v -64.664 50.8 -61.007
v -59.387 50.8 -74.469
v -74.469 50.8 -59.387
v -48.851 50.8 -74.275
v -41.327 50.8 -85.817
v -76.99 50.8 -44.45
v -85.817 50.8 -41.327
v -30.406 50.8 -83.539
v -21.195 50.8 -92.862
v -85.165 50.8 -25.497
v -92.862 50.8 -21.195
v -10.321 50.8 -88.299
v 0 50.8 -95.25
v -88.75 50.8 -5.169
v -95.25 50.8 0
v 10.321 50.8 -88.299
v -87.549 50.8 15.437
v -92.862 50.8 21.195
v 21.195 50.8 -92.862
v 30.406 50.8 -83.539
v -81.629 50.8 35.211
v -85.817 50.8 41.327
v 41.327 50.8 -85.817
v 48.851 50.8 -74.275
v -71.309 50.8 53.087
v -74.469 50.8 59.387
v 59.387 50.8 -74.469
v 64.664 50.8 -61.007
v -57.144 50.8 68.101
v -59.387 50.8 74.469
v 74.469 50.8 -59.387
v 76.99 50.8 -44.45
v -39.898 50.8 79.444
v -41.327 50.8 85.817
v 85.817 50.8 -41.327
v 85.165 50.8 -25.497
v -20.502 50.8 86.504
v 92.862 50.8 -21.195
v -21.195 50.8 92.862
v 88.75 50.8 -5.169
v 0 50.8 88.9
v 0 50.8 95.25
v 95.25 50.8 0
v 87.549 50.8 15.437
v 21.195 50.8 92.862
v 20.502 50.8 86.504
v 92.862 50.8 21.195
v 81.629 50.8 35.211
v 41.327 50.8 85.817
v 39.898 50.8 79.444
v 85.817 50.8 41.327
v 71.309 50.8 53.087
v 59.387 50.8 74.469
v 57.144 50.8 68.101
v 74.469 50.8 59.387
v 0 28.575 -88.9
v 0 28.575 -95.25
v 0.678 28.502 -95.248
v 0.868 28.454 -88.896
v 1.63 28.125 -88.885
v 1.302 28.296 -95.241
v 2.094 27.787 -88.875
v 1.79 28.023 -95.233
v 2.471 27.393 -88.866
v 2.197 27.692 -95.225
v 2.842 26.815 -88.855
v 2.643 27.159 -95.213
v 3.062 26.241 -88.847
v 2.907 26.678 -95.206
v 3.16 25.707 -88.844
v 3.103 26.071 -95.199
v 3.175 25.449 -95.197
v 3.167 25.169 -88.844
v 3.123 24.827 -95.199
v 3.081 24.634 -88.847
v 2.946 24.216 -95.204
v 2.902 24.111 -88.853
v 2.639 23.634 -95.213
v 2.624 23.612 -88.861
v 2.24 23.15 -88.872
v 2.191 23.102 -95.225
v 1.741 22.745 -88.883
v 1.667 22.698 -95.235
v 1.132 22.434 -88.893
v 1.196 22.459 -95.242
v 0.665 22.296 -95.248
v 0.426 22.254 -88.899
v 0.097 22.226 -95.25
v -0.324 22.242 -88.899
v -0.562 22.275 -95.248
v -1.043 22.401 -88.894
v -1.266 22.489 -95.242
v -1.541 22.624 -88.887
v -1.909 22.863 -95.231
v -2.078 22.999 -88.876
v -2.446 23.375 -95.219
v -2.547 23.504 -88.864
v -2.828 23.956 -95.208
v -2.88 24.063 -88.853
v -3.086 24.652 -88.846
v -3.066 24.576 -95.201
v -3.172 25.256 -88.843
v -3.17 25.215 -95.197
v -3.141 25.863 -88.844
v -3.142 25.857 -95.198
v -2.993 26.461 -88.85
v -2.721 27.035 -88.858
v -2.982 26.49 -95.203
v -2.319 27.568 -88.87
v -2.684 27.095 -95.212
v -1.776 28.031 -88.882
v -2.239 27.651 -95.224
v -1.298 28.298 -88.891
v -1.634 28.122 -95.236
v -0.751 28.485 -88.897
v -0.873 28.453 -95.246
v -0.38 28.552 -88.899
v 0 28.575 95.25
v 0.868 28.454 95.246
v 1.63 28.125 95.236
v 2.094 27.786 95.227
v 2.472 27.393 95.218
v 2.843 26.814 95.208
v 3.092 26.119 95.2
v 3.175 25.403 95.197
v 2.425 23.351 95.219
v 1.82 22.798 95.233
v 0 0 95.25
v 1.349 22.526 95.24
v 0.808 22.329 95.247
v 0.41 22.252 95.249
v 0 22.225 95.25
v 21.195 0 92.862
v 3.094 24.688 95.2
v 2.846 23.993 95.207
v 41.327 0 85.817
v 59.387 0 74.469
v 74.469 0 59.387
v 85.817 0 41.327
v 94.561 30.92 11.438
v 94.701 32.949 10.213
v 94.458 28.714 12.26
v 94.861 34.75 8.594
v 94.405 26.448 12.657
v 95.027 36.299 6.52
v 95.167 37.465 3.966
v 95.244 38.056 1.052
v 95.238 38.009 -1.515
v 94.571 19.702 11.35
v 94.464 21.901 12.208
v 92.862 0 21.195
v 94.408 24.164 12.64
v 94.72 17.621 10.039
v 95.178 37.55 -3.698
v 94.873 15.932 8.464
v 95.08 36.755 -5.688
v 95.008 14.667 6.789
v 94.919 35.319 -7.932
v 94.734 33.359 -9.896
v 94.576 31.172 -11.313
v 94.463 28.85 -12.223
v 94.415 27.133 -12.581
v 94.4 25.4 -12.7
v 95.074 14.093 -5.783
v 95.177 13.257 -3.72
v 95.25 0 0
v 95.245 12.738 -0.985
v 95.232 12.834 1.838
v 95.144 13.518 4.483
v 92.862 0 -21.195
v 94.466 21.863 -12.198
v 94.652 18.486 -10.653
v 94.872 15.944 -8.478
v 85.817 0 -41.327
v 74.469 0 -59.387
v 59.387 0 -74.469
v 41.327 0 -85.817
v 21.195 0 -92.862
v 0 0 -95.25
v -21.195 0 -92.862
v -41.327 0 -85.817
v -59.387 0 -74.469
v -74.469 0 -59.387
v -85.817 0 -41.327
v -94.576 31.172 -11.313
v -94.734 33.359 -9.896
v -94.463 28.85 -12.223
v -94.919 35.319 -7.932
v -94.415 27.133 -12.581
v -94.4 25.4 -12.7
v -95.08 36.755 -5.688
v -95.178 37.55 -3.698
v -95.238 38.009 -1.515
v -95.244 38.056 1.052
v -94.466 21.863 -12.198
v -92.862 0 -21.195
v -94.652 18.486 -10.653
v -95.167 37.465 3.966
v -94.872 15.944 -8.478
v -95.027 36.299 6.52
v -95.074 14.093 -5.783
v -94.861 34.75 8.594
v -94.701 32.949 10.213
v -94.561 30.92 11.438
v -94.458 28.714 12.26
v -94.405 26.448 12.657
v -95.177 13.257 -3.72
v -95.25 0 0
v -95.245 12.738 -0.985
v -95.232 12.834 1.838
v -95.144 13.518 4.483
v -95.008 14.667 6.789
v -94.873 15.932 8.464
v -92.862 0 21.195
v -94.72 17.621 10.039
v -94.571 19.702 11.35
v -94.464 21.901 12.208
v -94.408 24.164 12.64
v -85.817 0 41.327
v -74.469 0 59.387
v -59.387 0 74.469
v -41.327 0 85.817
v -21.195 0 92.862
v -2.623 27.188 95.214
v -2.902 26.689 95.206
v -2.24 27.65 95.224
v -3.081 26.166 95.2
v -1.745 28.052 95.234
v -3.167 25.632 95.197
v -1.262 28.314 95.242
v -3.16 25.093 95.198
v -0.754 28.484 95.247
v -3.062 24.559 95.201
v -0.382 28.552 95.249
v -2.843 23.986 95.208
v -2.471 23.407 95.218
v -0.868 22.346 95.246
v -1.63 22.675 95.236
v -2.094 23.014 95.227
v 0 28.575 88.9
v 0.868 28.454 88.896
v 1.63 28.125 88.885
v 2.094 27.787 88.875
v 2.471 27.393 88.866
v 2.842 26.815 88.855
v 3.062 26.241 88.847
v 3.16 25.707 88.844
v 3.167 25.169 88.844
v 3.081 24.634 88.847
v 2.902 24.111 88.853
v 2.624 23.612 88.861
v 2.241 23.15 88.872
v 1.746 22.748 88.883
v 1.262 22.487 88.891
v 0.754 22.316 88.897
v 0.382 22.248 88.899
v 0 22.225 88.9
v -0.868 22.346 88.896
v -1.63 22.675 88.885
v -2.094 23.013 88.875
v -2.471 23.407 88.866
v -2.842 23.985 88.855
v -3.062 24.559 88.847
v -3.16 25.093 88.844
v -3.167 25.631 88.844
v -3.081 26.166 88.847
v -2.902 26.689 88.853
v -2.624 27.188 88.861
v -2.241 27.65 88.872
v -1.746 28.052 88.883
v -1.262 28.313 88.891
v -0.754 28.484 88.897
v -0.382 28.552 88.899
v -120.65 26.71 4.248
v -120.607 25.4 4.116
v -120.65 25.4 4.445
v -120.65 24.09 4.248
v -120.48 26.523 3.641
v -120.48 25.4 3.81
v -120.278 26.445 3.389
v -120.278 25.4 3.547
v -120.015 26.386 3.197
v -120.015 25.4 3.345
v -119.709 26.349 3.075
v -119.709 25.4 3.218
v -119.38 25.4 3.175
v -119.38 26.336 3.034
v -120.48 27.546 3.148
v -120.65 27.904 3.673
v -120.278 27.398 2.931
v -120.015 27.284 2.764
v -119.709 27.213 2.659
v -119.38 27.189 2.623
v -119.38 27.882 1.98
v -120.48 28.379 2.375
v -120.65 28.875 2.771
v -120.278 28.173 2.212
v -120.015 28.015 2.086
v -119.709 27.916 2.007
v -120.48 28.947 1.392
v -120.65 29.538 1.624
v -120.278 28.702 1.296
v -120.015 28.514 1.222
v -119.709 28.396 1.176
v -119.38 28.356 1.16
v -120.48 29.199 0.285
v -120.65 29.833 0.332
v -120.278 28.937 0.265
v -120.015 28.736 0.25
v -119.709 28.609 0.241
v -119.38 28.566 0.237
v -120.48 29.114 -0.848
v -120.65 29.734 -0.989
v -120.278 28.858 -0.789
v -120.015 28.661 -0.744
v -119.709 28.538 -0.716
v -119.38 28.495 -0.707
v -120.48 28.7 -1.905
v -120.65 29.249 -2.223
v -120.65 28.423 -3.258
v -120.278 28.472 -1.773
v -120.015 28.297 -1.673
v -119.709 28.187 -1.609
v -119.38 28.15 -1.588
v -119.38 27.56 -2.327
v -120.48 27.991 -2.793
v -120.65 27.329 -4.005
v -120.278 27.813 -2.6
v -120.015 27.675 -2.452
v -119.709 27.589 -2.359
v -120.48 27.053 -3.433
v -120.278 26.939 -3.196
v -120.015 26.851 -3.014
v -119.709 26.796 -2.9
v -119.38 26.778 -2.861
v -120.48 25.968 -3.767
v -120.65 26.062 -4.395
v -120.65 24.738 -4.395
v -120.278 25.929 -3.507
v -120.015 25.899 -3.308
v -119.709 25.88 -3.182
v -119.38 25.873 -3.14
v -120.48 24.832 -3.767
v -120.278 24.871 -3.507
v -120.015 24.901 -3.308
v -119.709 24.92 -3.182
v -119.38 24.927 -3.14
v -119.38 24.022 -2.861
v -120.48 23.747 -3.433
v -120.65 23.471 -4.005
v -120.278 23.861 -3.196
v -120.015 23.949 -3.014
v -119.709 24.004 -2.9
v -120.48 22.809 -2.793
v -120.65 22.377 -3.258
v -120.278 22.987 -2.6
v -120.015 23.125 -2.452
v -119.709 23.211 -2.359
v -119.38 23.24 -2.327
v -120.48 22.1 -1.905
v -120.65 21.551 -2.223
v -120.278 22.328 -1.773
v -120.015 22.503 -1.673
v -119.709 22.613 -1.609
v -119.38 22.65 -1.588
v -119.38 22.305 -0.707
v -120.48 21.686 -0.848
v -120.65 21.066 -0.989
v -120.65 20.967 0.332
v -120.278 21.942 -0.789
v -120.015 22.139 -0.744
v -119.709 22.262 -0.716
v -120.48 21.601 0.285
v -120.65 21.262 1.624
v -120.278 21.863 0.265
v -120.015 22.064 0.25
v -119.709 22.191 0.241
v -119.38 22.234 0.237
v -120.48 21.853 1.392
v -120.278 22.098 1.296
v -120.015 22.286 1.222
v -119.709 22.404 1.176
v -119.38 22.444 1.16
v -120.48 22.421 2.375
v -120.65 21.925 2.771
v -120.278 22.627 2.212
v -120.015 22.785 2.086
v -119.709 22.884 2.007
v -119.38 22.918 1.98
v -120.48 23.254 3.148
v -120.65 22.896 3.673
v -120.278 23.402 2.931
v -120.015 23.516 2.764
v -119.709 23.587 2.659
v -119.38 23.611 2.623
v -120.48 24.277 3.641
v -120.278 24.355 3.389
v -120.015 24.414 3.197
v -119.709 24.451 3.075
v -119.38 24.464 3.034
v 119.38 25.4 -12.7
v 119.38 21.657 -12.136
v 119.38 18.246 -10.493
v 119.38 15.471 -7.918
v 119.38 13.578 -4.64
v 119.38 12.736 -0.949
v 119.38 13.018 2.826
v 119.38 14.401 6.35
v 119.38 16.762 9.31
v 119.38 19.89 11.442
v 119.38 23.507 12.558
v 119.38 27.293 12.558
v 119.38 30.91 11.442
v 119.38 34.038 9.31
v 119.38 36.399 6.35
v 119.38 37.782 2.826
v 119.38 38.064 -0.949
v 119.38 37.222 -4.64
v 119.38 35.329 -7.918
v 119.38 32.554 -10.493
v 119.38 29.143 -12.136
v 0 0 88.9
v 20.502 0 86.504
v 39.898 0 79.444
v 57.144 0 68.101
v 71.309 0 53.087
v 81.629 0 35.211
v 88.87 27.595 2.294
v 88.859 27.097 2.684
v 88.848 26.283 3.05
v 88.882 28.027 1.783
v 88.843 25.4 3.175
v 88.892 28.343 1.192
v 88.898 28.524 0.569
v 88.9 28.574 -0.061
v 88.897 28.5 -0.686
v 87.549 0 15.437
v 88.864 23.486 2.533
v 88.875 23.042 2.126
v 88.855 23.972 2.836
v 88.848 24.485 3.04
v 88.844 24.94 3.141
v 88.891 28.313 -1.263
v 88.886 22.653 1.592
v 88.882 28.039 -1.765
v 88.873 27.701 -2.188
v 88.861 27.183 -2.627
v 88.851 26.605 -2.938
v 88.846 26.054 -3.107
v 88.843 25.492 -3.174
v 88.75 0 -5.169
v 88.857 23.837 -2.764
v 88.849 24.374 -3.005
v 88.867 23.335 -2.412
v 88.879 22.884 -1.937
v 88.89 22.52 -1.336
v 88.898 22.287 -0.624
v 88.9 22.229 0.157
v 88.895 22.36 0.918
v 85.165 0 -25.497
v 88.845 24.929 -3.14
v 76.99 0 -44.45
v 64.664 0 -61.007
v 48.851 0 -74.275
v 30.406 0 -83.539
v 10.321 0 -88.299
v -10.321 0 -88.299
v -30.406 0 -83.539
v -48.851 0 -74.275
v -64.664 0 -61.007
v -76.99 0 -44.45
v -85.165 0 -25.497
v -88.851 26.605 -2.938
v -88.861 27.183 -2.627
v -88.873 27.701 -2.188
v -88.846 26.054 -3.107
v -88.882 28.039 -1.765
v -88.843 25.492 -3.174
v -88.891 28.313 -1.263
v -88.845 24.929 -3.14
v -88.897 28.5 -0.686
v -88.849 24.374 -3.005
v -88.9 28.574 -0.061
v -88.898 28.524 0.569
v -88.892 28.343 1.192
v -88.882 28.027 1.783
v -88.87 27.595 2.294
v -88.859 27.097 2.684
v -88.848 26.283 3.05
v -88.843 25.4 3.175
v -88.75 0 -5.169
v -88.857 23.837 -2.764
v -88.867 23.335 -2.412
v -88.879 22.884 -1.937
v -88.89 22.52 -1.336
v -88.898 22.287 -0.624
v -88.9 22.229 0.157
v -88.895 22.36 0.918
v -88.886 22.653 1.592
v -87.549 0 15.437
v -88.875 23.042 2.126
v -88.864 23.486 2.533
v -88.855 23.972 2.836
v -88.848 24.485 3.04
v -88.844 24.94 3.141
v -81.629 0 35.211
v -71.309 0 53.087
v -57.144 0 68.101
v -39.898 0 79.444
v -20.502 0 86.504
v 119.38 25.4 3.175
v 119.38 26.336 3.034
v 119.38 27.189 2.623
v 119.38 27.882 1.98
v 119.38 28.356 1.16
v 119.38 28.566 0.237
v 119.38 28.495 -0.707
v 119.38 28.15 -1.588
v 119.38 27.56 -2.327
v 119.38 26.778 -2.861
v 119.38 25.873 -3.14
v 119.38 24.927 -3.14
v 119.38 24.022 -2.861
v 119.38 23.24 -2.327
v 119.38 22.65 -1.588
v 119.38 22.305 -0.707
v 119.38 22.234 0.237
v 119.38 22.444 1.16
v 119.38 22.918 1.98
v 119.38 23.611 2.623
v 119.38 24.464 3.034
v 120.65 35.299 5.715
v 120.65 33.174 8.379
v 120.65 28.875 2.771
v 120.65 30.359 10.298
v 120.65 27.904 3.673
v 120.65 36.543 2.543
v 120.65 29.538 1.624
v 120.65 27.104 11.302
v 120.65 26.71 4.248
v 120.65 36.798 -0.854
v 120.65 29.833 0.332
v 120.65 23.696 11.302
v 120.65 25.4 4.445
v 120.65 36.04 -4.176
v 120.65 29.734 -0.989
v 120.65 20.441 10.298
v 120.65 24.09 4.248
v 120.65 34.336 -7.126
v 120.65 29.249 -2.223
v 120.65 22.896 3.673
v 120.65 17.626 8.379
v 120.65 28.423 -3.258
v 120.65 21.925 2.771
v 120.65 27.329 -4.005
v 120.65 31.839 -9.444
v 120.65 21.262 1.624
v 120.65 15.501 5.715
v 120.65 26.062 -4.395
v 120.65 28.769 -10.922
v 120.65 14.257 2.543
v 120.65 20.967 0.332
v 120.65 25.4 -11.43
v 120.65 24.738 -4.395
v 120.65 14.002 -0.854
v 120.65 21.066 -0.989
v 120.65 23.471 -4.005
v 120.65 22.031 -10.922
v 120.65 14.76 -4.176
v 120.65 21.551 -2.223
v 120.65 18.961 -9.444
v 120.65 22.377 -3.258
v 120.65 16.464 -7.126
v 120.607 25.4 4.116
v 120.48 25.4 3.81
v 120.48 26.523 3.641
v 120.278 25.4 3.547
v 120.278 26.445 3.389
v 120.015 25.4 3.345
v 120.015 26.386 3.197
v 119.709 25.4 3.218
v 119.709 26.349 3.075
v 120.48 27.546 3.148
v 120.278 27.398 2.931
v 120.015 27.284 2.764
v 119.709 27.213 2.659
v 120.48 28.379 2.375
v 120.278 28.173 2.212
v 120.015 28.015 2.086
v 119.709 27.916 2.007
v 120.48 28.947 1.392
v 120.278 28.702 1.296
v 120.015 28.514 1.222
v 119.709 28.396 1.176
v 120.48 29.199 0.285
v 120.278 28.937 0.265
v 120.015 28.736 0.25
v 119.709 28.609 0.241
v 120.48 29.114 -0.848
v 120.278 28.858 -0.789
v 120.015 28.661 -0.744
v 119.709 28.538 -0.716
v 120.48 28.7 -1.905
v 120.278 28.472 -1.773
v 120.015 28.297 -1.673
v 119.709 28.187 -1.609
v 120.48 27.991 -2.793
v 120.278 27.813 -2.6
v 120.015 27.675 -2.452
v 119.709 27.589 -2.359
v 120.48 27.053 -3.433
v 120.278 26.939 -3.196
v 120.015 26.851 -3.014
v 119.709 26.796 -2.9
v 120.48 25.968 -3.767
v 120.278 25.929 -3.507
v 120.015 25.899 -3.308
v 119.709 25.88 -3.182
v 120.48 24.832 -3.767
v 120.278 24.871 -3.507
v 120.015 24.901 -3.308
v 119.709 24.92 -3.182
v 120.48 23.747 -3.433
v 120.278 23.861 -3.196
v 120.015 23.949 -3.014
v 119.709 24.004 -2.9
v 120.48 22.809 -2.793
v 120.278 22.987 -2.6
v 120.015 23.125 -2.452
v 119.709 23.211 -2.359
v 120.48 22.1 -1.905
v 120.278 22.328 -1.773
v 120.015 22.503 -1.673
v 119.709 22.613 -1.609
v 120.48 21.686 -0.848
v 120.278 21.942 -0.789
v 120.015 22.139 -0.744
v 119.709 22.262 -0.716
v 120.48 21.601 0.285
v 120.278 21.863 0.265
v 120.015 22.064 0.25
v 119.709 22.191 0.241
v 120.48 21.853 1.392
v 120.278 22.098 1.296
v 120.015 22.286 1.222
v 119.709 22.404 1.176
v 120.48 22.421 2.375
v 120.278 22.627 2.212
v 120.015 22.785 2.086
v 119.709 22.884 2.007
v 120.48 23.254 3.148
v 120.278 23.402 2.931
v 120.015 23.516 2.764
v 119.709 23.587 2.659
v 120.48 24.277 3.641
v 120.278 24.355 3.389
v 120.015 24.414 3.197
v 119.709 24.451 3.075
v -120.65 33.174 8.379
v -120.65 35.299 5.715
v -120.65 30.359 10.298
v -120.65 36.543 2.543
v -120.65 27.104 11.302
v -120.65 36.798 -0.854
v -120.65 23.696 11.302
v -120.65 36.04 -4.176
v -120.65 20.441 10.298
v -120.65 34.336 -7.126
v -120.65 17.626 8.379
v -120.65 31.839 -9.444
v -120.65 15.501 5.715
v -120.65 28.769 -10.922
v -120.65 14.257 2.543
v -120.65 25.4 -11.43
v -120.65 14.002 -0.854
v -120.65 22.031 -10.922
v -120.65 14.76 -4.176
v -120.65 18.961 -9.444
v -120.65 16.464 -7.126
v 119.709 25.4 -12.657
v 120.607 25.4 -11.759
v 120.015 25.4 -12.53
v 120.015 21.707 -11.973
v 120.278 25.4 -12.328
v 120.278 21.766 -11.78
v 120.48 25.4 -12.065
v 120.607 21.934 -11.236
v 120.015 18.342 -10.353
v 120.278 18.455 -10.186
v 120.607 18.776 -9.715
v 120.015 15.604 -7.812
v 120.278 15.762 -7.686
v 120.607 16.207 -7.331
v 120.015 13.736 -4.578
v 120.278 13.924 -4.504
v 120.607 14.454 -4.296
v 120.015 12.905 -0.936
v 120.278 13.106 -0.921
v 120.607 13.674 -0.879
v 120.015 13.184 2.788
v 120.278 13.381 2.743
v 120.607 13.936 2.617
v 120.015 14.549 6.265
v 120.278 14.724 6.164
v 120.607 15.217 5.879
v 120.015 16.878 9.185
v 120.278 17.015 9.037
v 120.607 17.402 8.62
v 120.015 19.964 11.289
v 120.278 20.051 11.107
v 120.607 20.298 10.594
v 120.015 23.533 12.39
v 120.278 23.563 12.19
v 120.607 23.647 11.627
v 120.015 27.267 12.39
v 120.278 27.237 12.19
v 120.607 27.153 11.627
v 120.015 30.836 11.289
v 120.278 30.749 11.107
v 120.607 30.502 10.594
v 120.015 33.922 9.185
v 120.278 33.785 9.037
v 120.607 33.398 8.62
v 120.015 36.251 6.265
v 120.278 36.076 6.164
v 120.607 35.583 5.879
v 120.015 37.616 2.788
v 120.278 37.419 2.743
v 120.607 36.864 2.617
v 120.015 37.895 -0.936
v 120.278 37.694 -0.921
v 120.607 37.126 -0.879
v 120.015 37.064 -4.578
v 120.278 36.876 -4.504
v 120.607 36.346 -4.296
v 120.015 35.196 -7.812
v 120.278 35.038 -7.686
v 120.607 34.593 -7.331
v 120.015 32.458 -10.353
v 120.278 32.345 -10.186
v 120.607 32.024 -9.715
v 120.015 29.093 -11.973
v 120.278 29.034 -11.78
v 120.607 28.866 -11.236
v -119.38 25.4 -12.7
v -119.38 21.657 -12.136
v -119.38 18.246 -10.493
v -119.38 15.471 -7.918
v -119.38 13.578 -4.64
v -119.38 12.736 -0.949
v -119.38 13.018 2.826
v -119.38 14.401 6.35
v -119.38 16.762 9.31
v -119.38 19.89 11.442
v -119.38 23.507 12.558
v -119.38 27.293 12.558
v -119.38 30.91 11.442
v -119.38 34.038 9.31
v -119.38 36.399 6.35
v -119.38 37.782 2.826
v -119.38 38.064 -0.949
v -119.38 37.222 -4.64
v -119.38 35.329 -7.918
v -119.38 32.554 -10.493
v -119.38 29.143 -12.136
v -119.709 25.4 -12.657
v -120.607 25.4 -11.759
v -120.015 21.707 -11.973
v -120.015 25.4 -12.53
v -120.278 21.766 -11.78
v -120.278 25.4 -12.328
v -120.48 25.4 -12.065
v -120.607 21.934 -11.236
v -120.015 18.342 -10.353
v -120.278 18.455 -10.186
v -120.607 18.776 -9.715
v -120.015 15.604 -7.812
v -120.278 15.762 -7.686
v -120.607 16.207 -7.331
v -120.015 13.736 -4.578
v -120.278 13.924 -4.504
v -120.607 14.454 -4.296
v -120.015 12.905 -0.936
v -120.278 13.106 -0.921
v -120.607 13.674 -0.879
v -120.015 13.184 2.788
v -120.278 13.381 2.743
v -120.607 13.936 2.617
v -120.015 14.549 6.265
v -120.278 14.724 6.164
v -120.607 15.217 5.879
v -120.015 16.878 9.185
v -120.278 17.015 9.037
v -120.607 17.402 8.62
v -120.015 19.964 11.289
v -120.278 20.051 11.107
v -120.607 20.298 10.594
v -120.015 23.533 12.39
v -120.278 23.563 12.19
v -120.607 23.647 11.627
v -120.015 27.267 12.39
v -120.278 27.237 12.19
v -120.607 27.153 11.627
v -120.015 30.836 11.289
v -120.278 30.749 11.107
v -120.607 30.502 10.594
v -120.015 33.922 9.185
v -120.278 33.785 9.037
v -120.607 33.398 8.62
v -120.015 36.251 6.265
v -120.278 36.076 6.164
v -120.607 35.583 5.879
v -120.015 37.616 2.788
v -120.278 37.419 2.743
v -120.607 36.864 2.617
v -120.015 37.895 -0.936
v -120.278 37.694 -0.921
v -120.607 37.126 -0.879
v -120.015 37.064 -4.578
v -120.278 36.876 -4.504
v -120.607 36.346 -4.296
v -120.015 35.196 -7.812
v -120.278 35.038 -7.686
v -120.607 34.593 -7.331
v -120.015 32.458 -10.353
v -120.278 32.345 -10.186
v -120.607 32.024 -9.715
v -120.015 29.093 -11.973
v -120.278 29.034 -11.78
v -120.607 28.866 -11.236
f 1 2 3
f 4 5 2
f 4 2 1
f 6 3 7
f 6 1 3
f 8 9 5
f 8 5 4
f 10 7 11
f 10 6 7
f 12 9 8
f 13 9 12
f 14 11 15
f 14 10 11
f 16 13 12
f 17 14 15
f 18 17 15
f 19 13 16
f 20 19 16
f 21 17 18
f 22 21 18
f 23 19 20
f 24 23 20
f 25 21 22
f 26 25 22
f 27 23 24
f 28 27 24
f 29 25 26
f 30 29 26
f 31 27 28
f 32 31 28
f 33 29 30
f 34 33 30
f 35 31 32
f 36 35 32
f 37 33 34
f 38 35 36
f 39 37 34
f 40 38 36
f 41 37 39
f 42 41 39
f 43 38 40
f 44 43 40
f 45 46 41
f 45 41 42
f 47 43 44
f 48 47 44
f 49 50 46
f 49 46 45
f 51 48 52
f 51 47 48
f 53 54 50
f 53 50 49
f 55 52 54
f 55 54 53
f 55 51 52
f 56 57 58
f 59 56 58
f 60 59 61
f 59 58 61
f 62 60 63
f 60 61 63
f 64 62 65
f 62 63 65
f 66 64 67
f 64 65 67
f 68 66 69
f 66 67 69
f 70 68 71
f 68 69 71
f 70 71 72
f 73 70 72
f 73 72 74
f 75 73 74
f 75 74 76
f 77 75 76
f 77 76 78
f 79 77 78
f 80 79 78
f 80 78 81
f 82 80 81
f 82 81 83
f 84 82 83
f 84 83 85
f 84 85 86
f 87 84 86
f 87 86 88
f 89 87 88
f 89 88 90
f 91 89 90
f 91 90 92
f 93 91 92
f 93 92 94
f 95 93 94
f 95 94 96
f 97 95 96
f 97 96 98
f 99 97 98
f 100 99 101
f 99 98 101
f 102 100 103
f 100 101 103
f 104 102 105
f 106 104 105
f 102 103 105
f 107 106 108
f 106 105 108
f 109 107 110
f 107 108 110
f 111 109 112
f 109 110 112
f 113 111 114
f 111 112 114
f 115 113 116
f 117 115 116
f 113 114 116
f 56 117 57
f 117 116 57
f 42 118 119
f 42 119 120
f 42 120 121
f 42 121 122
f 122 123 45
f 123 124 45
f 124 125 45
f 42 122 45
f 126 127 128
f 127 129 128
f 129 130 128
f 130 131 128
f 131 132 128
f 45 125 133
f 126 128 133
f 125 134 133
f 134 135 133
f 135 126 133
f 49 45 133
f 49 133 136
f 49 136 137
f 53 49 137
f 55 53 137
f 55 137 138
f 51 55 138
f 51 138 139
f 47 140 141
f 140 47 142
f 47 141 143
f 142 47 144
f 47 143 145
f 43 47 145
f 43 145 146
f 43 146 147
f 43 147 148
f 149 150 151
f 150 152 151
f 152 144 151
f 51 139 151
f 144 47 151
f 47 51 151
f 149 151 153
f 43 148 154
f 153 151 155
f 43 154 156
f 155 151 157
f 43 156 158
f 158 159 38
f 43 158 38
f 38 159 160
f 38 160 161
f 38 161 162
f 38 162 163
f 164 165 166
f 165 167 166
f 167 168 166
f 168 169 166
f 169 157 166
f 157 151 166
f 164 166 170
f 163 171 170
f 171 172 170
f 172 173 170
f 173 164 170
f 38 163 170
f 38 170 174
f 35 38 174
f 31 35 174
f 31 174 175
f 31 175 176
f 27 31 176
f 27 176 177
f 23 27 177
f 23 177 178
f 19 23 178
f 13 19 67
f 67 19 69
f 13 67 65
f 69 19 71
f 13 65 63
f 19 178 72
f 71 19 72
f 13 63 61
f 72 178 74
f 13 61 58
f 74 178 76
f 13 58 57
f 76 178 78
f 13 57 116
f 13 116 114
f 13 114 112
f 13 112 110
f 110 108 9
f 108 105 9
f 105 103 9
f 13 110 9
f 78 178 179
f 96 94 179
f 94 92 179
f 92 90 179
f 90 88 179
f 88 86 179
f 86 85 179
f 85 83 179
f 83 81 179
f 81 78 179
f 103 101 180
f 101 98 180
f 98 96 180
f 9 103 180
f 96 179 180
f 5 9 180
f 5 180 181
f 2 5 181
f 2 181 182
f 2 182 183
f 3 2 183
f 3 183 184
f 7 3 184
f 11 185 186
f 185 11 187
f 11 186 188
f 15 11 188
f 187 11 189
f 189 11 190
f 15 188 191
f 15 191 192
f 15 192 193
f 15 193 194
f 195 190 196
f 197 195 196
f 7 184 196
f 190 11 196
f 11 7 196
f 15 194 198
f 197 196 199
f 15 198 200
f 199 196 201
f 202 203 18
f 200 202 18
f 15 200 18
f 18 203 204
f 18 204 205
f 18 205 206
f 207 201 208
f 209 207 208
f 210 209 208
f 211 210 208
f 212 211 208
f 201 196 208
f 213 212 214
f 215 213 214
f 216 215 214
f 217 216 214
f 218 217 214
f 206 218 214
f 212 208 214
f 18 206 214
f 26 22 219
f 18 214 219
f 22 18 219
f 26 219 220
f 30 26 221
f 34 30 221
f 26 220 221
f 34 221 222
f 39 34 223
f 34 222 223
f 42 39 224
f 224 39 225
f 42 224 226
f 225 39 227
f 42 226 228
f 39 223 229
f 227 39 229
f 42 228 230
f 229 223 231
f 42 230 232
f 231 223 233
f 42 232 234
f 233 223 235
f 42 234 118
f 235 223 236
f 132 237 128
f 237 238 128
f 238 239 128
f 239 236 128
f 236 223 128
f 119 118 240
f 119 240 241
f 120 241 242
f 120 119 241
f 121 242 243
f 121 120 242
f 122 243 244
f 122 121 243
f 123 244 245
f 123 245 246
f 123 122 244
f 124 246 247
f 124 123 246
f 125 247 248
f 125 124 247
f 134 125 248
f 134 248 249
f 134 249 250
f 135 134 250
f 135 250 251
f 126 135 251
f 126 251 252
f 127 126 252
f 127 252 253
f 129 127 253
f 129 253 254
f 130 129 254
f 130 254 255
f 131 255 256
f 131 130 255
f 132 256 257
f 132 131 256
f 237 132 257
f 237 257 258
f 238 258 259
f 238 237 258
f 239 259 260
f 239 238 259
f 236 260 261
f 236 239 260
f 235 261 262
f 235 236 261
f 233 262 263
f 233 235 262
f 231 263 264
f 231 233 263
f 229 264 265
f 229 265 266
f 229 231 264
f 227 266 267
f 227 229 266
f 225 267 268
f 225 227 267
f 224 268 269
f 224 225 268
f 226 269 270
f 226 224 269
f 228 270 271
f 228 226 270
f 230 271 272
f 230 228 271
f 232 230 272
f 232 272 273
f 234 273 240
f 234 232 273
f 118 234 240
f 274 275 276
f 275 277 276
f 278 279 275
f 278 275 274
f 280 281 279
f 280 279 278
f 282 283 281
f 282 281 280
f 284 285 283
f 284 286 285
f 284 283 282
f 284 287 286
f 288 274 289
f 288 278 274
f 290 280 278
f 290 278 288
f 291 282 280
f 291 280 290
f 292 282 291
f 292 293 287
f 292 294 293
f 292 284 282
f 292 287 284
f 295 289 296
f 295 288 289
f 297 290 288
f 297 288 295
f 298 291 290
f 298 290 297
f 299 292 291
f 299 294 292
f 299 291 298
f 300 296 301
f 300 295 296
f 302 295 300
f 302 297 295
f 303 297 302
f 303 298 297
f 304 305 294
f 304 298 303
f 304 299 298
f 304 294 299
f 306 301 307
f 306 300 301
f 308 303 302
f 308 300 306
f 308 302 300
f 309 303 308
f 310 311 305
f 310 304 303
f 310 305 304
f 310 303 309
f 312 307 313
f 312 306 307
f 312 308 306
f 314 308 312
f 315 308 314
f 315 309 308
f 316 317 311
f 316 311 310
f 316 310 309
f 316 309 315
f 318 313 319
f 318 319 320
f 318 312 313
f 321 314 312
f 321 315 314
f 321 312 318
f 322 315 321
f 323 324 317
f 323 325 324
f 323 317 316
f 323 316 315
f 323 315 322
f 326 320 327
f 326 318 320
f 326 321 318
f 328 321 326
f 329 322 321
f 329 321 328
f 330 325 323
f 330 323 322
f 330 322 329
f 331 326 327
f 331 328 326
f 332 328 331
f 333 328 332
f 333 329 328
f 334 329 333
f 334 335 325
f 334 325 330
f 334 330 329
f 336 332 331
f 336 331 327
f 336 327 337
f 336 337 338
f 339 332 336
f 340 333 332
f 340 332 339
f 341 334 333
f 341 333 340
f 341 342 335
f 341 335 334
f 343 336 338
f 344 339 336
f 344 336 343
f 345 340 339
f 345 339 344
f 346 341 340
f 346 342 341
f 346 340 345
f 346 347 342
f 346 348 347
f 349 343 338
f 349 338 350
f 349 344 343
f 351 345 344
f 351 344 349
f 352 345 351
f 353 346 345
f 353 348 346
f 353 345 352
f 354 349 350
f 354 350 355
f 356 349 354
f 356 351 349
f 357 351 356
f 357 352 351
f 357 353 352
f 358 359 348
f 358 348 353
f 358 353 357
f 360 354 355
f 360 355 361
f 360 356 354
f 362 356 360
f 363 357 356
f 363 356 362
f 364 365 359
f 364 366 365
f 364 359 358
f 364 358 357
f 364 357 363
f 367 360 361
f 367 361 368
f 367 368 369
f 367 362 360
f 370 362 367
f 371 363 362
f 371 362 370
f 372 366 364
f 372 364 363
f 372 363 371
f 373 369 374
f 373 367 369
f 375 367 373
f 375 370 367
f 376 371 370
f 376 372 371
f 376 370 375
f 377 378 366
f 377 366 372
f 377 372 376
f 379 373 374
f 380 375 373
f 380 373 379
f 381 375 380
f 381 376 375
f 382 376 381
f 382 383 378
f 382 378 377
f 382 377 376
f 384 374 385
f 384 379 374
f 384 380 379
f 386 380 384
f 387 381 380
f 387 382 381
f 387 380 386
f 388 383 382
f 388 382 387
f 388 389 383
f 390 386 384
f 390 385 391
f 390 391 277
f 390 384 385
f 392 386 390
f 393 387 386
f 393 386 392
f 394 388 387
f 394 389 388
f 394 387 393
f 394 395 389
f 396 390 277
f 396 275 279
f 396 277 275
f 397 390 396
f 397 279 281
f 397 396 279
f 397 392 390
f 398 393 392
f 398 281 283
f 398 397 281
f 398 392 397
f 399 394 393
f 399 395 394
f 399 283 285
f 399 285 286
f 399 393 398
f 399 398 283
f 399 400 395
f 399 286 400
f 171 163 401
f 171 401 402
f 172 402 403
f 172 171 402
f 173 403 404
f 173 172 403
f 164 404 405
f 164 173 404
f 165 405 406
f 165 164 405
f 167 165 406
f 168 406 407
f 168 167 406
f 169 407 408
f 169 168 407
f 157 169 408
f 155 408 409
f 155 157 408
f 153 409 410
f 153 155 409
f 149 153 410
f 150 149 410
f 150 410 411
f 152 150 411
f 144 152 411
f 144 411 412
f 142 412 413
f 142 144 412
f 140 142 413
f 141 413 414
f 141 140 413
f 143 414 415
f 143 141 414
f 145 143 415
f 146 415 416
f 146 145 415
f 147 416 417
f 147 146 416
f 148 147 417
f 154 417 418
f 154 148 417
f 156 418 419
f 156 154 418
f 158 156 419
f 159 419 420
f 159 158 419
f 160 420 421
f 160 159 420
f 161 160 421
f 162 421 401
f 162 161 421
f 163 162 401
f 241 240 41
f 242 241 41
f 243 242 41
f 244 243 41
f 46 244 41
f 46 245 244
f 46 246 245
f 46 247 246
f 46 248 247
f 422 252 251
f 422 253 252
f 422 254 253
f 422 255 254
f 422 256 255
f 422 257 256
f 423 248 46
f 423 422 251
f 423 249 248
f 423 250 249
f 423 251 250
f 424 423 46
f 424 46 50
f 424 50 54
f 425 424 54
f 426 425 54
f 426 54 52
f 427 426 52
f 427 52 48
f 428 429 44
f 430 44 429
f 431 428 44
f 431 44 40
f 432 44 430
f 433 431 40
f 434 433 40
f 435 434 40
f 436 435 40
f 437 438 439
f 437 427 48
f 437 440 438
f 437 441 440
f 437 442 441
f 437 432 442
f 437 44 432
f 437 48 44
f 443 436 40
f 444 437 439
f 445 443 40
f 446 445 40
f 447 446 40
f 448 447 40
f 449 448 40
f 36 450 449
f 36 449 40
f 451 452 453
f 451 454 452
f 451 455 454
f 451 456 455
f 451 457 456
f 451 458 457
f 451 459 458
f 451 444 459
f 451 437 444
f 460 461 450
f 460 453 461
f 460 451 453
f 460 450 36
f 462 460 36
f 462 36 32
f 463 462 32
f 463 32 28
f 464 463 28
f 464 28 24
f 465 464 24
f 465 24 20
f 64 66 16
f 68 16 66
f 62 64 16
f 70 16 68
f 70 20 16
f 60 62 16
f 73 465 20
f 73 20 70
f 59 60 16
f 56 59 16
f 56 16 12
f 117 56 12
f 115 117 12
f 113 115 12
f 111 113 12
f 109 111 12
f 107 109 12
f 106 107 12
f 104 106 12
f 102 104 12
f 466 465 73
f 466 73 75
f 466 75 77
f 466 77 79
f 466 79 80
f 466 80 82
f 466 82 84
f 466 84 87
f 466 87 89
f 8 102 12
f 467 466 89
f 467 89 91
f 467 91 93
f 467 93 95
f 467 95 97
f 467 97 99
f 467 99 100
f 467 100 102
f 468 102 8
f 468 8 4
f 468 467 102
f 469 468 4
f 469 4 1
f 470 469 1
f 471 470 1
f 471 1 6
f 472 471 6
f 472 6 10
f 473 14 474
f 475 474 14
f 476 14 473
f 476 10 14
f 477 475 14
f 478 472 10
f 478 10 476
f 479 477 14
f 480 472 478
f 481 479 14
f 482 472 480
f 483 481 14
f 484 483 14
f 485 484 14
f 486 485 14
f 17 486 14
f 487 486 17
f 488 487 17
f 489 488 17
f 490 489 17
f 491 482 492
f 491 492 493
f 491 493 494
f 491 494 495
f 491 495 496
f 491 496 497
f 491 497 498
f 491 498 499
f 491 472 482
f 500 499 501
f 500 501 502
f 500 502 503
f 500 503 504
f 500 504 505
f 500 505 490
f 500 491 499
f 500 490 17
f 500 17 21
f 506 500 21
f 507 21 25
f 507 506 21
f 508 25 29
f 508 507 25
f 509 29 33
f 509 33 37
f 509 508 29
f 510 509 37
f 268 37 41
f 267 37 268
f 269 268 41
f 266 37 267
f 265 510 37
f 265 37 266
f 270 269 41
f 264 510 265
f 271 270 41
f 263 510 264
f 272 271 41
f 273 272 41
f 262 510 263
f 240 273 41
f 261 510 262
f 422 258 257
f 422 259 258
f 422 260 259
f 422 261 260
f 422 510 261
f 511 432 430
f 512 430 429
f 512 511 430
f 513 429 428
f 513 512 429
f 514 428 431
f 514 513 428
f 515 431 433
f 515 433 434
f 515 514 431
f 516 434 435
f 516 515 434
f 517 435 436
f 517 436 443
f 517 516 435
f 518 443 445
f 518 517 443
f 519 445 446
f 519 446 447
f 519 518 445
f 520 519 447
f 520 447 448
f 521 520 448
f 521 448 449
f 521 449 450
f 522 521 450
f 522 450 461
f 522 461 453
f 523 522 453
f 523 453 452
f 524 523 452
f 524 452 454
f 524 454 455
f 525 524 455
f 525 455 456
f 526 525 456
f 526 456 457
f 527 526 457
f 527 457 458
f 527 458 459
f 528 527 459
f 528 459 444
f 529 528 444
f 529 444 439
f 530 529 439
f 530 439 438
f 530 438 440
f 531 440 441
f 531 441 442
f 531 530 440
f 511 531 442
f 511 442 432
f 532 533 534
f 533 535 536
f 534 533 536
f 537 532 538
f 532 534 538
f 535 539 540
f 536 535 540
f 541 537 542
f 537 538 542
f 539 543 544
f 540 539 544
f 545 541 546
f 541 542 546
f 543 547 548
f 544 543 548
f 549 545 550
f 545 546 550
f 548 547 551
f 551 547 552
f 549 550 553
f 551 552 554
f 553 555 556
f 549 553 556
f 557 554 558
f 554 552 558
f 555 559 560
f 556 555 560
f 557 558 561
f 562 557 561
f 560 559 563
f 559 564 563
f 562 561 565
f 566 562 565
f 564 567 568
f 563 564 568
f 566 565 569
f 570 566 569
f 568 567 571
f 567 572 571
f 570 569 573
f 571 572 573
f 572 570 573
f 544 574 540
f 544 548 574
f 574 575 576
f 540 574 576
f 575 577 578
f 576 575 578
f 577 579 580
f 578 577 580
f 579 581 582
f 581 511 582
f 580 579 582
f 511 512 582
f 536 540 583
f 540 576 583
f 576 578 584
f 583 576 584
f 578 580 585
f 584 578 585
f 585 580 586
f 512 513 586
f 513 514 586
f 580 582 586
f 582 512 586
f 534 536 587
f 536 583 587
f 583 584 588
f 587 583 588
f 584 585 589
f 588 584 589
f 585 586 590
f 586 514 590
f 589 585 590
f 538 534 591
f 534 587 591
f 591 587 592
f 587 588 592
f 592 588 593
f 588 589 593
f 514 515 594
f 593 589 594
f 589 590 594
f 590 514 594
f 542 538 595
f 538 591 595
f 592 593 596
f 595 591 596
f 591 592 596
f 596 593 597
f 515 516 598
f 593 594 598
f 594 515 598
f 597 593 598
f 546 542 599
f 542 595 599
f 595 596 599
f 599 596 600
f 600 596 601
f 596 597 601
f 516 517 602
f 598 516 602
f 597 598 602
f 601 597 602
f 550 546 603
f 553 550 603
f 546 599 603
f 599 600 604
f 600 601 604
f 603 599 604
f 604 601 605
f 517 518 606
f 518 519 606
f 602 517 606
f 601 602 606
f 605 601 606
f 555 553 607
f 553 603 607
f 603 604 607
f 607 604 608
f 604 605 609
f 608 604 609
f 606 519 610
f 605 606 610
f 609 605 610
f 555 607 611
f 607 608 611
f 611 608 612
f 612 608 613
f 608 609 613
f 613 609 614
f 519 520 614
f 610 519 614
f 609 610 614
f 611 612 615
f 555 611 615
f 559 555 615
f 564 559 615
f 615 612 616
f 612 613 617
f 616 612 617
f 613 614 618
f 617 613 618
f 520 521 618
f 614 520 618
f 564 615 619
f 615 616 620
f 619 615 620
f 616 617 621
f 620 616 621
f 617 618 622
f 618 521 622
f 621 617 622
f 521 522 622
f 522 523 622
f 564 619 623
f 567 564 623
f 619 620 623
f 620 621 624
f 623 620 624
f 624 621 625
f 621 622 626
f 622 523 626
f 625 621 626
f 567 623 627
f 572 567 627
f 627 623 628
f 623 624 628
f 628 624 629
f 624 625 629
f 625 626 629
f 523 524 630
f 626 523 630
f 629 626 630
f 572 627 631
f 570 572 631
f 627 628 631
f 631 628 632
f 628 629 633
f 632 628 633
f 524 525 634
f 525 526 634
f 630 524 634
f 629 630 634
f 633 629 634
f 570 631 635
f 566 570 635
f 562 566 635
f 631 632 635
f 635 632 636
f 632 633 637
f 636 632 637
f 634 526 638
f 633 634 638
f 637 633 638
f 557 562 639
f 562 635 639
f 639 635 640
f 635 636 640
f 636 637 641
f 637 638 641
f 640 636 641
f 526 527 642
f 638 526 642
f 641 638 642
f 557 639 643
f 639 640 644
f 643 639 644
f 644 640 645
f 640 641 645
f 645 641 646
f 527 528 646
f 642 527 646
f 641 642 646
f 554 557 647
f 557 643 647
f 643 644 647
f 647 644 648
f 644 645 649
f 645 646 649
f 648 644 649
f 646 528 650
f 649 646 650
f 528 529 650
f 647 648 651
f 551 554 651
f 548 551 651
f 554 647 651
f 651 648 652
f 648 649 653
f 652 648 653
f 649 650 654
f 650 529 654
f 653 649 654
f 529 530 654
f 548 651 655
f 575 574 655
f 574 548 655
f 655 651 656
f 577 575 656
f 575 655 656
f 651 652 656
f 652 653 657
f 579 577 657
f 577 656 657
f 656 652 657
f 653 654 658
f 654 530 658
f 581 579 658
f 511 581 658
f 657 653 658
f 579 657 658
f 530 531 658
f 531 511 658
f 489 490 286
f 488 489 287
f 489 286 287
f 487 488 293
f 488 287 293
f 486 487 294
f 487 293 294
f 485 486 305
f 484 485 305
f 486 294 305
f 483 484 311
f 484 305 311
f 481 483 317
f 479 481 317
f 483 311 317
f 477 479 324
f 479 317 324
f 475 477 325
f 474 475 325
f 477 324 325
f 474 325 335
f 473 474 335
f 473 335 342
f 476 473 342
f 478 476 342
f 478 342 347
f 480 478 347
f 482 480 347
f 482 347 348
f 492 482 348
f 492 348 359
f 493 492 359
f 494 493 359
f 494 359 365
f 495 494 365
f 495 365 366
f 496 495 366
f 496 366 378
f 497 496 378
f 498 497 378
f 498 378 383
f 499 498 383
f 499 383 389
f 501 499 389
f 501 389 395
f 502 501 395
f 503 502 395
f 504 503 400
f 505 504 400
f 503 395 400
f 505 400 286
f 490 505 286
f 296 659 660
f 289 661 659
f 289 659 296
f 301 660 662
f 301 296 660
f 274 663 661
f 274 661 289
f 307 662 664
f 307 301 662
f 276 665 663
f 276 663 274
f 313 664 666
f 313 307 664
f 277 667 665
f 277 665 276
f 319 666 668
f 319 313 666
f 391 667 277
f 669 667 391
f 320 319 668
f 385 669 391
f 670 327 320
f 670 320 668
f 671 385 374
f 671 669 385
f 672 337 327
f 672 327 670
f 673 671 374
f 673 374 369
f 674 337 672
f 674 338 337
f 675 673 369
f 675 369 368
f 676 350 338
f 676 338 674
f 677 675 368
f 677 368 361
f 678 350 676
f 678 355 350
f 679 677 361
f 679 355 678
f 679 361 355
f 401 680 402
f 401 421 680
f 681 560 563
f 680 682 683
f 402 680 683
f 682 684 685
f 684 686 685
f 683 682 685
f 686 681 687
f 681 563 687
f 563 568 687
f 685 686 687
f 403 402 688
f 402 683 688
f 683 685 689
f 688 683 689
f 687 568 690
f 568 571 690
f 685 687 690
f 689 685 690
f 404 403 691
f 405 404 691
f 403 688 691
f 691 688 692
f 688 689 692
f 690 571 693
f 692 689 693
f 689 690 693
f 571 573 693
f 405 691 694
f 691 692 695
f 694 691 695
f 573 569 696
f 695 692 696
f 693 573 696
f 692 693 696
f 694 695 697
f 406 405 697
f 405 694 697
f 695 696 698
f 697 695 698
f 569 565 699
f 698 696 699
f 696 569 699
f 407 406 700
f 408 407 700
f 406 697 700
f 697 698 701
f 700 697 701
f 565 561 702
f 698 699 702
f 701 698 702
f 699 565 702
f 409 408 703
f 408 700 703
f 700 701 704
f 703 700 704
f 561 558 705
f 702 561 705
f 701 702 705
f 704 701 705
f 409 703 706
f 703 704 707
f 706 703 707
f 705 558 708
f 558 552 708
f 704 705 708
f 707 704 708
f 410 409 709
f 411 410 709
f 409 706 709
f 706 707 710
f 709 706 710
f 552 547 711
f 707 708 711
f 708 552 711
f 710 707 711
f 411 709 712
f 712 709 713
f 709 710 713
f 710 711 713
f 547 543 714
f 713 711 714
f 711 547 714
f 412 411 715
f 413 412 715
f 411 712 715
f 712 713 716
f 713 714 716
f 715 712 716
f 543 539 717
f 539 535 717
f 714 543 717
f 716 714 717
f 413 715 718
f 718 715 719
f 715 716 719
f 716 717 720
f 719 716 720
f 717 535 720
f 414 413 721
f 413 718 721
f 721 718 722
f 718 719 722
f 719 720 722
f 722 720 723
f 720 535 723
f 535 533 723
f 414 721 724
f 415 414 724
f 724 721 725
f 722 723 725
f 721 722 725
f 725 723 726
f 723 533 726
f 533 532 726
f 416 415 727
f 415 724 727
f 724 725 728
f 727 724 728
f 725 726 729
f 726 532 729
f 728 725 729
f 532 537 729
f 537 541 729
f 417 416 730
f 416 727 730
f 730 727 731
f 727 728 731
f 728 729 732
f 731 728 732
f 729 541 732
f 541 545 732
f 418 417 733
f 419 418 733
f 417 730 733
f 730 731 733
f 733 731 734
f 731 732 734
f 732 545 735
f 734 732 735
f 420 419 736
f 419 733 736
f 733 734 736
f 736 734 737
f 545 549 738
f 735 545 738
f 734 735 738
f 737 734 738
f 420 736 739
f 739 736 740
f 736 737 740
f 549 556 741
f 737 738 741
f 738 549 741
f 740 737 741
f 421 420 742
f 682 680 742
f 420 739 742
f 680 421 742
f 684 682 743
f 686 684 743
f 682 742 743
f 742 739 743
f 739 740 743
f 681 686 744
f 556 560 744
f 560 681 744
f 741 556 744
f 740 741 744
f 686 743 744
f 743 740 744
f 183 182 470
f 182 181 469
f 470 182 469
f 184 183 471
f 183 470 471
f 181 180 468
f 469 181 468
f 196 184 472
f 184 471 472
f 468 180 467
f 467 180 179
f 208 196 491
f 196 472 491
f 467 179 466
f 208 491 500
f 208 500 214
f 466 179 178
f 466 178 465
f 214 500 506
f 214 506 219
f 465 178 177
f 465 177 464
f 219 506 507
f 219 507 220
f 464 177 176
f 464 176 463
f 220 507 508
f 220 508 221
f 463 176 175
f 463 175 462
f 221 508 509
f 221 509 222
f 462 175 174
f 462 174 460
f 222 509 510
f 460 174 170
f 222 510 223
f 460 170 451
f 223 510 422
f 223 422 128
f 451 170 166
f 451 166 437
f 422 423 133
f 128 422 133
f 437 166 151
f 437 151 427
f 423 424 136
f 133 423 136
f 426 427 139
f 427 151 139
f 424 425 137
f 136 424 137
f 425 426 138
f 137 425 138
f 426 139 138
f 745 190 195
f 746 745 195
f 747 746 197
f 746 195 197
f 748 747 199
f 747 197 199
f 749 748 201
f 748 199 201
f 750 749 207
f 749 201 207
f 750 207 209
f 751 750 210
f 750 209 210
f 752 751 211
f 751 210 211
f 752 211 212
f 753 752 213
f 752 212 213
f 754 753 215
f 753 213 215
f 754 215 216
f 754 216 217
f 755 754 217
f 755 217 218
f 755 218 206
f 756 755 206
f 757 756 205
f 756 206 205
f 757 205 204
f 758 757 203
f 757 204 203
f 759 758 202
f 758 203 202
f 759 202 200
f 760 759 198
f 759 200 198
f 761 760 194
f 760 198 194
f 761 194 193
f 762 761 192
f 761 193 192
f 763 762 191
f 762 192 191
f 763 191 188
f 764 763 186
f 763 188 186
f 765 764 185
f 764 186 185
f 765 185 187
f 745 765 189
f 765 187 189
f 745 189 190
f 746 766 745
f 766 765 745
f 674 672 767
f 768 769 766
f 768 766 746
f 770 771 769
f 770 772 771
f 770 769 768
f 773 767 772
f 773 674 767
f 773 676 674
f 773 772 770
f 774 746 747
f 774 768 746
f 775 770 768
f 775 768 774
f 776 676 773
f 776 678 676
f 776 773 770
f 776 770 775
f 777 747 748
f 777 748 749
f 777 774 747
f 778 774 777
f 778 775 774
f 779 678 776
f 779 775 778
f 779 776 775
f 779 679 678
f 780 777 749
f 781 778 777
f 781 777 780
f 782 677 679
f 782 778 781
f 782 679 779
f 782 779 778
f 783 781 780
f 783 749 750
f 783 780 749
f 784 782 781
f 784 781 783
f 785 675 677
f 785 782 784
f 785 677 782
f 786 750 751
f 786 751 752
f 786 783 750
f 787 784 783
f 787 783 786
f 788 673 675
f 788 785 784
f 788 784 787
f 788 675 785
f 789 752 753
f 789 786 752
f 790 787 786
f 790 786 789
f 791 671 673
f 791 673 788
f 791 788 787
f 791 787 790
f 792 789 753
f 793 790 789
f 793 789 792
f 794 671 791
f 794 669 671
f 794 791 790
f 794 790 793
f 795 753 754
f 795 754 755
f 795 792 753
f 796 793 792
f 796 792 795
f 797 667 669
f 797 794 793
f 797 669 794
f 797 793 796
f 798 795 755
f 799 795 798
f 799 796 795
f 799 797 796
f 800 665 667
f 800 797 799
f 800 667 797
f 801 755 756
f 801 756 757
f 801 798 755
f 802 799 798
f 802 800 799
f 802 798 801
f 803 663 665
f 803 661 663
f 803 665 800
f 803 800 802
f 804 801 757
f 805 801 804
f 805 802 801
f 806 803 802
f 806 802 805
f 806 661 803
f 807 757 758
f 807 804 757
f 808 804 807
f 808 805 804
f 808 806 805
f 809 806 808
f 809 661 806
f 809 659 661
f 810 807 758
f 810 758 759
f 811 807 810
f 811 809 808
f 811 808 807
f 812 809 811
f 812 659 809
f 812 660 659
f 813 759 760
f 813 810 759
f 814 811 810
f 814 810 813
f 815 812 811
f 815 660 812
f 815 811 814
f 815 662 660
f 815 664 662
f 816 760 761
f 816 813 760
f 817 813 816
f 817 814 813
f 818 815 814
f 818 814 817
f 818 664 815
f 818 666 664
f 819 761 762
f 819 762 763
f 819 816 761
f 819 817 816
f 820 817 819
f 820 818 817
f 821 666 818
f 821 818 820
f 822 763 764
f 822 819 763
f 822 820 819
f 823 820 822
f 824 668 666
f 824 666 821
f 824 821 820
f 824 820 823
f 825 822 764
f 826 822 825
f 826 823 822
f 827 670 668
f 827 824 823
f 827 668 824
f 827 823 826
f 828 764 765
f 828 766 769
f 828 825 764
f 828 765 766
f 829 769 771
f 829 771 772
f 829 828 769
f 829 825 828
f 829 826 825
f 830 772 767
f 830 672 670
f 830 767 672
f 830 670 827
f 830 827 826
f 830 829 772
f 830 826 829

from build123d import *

# Parameters (mm, degrees)
SKETCH1_R           = 95.25
SKETCH1_R_2         = 88.9
BOSS_EXTRUDE1_DEPTH = 50.8
BOSS_EXTRUDE2_START = -0.850464
SKETCH2_R           = 12.7
BOSS_EXTRUDE2_DEPTH = 26.250464
SKETCH3_R           = 3.175
CUT_EXTRUDE1_DEPTH  = 50.8
FILLET1_R           = 1.27
SKETCH4_R           = 3.175
CUT_EXTRUDE2_DEPTH  = 10.16


with BuildPart() as part:
    # Sketch1 → Boss-Extrude1 (new body)
    with BuildSketch(Plane(origin=(0, 0, 0), x_dir=(1, 0, 0), z_dir=(0, 1, 0))):
        with Locations(Location((0, 0, 0), (0, 0, 270))):
            Circle(SKETCH1_R)
        with Locations(Location((0, 0, 0), (0, 0, 270))):
            Circle(SKETCH1_R_2, mode=Mode.SUBTRACT)
    extrude(amount=BOSS_EXTRUDE1_DEPTH)

    # Sketch2 → Boss-Extrude2 (add)
    with BuildSketch(Plane.ZY.offset(95.25).offset(BOSS_EXTRUDE2_START)):
        with Locations(Location((0, 25.4, 0), (0, 0, 180))):
            Circle(SKETCH2_R)
    boss_extrude2 = extrude(amount=BOSS_EXTRUDE2_DEPTH)

    # Sketch3 → Cut-Extrude1 (cut)
    with BuildSketch(Plane.ZY.offset(120.65)):
        with Locations((0, 25.4)):
            Circle(SKETCH3_R)
    cut_extrude1 = extrude(amount=-CUT_EXTRUDE1_DEPTH, mode=Mode.SUBTRACT)

    # Mirror1: Boss-Extrude2, Cut-Extrude1 across plane
    add(boss_extrude2.mirror(Plane(origin=(0, 0, 0), x_dir=(0, 0, 1), z_dir=(1, 0, 0))))
    add(cut_extrude1.mirror(Plane(origin=(0, 0, 0), x_dir=(0, 0, 1), z_dir=(1, 0, 0))), mode=Mode.SUBTRACT)

    # Fillet1
    fillet1_edges = [part.edges().sort_by_distance(p)[0] for p in [
        (-120.65, 25.4, 12.7),
        (-120.65, 25.4, -3.175),
        (120.65, 25.4, 12.7),
        (120.65, 25.4, -3.175),
    ]]
    fillet(fillet1_edges, radius=FILLET1_R)

    # Sketch4 → Cut-Extrude2 (cut)
    with BuildSketch(Plane(origin=(0, 0, -95.25), x_dir=(-1, 0, 0), z_dir=(0, 0, -1))):
        with Locations(Location((0, 25.4, 0), (0, 0, 90))):
            Circle(SKETCH4_R)
    cut_extrude2 = extrude(amount=-CUT_EXTRUDE2_DEPTH, mode=Mode.SUBTRACT)

    # Mirror2: Cut-Extrude2 across plane
    add(cut_extrude2.mirror(Plane.XY), mode=Mode.SUBTRACT)


solid = part.part
